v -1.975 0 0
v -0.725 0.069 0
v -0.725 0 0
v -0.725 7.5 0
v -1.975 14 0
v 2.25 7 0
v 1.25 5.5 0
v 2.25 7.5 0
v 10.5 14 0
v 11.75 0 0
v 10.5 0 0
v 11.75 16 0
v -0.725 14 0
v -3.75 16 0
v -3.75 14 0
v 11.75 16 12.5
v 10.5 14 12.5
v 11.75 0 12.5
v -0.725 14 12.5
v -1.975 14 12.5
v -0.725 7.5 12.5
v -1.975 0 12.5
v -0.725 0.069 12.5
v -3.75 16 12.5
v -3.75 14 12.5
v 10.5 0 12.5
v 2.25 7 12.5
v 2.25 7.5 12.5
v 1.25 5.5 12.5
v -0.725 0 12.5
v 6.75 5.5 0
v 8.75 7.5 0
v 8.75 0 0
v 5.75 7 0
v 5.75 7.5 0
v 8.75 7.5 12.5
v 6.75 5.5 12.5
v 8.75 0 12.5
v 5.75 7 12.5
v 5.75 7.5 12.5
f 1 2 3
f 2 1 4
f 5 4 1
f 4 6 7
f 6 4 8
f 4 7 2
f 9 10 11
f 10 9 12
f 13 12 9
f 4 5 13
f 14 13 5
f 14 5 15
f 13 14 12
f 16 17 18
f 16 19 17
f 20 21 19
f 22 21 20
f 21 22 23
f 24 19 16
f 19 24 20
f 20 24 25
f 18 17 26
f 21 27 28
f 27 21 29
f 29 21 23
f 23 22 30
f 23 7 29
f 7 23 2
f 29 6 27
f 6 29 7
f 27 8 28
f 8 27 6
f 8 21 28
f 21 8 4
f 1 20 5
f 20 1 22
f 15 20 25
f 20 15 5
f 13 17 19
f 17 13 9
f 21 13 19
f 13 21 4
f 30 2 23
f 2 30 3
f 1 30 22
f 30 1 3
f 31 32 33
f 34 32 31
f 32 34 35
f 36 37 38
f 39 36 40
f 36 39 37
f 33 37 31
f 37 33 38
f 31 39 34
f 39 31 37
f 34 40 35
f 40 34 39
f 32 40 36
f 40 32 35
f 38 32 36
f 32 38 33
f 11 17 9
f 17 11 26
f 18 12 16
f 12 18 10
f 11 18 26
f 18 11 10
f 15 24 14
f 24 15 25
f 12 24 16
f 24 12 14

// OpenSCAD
// file: config.scad
HEX_WIDTH= 125;
HEX_BORDER = 7;
HEX_HEIGHT = 20;
HEX_ARM = HEX_WIDTH / 6;
SHIELD_THICKNESS = 2;

SNAPFIT_DEPTH = 12.5;
SNAPFIT_HEIGHT = 7.5;
// main file
include <config.scad>

// Shape
distance_x = HEX_BORDER * 2 - 6;
distance_y = 14;

// snapfit
width = 3;

module snapfit() {
    color("blue")
    linear_extrude(SNAPFIT_DEPTH)
    rotate(180)
    mirror([1,0,0])
    translate([0,-SNAPFIT_HEIGHT,0])
    polygon([
        [0,0],
        [width,0],
        [width, .5],
        [width - 1, 2],
        [0, SNAPFIT_HEIGHT],
        [0, 0],
    ]);
}

translate([-.75,0,0])
snapfit();

color("red")
linear_extrude(SNAPFIT_DEPTH)
translate([-1.35,distance_y/2,0])
square([1.25, distance_y], center=true);


translate([distance_x+.75, 0, 0])
mirror([1,0,0])
snapfit();

translate([distance_x+SNAPFIT_HEIGHT/2, 0, 0])
color("red")
linear_extrude(SNAPFIT_DEPTH)
translate([-.625,distance_y/2,0])
square([1.25, distance_y], center=true);

color("purple")
linear_extrude(SNAPFIT_DEPTH)
translate([-SNAPFIT_HEIGHT/2, distance_y, 0])
square([distance_x+SNAPFIT_HEIGHT, 2]);
